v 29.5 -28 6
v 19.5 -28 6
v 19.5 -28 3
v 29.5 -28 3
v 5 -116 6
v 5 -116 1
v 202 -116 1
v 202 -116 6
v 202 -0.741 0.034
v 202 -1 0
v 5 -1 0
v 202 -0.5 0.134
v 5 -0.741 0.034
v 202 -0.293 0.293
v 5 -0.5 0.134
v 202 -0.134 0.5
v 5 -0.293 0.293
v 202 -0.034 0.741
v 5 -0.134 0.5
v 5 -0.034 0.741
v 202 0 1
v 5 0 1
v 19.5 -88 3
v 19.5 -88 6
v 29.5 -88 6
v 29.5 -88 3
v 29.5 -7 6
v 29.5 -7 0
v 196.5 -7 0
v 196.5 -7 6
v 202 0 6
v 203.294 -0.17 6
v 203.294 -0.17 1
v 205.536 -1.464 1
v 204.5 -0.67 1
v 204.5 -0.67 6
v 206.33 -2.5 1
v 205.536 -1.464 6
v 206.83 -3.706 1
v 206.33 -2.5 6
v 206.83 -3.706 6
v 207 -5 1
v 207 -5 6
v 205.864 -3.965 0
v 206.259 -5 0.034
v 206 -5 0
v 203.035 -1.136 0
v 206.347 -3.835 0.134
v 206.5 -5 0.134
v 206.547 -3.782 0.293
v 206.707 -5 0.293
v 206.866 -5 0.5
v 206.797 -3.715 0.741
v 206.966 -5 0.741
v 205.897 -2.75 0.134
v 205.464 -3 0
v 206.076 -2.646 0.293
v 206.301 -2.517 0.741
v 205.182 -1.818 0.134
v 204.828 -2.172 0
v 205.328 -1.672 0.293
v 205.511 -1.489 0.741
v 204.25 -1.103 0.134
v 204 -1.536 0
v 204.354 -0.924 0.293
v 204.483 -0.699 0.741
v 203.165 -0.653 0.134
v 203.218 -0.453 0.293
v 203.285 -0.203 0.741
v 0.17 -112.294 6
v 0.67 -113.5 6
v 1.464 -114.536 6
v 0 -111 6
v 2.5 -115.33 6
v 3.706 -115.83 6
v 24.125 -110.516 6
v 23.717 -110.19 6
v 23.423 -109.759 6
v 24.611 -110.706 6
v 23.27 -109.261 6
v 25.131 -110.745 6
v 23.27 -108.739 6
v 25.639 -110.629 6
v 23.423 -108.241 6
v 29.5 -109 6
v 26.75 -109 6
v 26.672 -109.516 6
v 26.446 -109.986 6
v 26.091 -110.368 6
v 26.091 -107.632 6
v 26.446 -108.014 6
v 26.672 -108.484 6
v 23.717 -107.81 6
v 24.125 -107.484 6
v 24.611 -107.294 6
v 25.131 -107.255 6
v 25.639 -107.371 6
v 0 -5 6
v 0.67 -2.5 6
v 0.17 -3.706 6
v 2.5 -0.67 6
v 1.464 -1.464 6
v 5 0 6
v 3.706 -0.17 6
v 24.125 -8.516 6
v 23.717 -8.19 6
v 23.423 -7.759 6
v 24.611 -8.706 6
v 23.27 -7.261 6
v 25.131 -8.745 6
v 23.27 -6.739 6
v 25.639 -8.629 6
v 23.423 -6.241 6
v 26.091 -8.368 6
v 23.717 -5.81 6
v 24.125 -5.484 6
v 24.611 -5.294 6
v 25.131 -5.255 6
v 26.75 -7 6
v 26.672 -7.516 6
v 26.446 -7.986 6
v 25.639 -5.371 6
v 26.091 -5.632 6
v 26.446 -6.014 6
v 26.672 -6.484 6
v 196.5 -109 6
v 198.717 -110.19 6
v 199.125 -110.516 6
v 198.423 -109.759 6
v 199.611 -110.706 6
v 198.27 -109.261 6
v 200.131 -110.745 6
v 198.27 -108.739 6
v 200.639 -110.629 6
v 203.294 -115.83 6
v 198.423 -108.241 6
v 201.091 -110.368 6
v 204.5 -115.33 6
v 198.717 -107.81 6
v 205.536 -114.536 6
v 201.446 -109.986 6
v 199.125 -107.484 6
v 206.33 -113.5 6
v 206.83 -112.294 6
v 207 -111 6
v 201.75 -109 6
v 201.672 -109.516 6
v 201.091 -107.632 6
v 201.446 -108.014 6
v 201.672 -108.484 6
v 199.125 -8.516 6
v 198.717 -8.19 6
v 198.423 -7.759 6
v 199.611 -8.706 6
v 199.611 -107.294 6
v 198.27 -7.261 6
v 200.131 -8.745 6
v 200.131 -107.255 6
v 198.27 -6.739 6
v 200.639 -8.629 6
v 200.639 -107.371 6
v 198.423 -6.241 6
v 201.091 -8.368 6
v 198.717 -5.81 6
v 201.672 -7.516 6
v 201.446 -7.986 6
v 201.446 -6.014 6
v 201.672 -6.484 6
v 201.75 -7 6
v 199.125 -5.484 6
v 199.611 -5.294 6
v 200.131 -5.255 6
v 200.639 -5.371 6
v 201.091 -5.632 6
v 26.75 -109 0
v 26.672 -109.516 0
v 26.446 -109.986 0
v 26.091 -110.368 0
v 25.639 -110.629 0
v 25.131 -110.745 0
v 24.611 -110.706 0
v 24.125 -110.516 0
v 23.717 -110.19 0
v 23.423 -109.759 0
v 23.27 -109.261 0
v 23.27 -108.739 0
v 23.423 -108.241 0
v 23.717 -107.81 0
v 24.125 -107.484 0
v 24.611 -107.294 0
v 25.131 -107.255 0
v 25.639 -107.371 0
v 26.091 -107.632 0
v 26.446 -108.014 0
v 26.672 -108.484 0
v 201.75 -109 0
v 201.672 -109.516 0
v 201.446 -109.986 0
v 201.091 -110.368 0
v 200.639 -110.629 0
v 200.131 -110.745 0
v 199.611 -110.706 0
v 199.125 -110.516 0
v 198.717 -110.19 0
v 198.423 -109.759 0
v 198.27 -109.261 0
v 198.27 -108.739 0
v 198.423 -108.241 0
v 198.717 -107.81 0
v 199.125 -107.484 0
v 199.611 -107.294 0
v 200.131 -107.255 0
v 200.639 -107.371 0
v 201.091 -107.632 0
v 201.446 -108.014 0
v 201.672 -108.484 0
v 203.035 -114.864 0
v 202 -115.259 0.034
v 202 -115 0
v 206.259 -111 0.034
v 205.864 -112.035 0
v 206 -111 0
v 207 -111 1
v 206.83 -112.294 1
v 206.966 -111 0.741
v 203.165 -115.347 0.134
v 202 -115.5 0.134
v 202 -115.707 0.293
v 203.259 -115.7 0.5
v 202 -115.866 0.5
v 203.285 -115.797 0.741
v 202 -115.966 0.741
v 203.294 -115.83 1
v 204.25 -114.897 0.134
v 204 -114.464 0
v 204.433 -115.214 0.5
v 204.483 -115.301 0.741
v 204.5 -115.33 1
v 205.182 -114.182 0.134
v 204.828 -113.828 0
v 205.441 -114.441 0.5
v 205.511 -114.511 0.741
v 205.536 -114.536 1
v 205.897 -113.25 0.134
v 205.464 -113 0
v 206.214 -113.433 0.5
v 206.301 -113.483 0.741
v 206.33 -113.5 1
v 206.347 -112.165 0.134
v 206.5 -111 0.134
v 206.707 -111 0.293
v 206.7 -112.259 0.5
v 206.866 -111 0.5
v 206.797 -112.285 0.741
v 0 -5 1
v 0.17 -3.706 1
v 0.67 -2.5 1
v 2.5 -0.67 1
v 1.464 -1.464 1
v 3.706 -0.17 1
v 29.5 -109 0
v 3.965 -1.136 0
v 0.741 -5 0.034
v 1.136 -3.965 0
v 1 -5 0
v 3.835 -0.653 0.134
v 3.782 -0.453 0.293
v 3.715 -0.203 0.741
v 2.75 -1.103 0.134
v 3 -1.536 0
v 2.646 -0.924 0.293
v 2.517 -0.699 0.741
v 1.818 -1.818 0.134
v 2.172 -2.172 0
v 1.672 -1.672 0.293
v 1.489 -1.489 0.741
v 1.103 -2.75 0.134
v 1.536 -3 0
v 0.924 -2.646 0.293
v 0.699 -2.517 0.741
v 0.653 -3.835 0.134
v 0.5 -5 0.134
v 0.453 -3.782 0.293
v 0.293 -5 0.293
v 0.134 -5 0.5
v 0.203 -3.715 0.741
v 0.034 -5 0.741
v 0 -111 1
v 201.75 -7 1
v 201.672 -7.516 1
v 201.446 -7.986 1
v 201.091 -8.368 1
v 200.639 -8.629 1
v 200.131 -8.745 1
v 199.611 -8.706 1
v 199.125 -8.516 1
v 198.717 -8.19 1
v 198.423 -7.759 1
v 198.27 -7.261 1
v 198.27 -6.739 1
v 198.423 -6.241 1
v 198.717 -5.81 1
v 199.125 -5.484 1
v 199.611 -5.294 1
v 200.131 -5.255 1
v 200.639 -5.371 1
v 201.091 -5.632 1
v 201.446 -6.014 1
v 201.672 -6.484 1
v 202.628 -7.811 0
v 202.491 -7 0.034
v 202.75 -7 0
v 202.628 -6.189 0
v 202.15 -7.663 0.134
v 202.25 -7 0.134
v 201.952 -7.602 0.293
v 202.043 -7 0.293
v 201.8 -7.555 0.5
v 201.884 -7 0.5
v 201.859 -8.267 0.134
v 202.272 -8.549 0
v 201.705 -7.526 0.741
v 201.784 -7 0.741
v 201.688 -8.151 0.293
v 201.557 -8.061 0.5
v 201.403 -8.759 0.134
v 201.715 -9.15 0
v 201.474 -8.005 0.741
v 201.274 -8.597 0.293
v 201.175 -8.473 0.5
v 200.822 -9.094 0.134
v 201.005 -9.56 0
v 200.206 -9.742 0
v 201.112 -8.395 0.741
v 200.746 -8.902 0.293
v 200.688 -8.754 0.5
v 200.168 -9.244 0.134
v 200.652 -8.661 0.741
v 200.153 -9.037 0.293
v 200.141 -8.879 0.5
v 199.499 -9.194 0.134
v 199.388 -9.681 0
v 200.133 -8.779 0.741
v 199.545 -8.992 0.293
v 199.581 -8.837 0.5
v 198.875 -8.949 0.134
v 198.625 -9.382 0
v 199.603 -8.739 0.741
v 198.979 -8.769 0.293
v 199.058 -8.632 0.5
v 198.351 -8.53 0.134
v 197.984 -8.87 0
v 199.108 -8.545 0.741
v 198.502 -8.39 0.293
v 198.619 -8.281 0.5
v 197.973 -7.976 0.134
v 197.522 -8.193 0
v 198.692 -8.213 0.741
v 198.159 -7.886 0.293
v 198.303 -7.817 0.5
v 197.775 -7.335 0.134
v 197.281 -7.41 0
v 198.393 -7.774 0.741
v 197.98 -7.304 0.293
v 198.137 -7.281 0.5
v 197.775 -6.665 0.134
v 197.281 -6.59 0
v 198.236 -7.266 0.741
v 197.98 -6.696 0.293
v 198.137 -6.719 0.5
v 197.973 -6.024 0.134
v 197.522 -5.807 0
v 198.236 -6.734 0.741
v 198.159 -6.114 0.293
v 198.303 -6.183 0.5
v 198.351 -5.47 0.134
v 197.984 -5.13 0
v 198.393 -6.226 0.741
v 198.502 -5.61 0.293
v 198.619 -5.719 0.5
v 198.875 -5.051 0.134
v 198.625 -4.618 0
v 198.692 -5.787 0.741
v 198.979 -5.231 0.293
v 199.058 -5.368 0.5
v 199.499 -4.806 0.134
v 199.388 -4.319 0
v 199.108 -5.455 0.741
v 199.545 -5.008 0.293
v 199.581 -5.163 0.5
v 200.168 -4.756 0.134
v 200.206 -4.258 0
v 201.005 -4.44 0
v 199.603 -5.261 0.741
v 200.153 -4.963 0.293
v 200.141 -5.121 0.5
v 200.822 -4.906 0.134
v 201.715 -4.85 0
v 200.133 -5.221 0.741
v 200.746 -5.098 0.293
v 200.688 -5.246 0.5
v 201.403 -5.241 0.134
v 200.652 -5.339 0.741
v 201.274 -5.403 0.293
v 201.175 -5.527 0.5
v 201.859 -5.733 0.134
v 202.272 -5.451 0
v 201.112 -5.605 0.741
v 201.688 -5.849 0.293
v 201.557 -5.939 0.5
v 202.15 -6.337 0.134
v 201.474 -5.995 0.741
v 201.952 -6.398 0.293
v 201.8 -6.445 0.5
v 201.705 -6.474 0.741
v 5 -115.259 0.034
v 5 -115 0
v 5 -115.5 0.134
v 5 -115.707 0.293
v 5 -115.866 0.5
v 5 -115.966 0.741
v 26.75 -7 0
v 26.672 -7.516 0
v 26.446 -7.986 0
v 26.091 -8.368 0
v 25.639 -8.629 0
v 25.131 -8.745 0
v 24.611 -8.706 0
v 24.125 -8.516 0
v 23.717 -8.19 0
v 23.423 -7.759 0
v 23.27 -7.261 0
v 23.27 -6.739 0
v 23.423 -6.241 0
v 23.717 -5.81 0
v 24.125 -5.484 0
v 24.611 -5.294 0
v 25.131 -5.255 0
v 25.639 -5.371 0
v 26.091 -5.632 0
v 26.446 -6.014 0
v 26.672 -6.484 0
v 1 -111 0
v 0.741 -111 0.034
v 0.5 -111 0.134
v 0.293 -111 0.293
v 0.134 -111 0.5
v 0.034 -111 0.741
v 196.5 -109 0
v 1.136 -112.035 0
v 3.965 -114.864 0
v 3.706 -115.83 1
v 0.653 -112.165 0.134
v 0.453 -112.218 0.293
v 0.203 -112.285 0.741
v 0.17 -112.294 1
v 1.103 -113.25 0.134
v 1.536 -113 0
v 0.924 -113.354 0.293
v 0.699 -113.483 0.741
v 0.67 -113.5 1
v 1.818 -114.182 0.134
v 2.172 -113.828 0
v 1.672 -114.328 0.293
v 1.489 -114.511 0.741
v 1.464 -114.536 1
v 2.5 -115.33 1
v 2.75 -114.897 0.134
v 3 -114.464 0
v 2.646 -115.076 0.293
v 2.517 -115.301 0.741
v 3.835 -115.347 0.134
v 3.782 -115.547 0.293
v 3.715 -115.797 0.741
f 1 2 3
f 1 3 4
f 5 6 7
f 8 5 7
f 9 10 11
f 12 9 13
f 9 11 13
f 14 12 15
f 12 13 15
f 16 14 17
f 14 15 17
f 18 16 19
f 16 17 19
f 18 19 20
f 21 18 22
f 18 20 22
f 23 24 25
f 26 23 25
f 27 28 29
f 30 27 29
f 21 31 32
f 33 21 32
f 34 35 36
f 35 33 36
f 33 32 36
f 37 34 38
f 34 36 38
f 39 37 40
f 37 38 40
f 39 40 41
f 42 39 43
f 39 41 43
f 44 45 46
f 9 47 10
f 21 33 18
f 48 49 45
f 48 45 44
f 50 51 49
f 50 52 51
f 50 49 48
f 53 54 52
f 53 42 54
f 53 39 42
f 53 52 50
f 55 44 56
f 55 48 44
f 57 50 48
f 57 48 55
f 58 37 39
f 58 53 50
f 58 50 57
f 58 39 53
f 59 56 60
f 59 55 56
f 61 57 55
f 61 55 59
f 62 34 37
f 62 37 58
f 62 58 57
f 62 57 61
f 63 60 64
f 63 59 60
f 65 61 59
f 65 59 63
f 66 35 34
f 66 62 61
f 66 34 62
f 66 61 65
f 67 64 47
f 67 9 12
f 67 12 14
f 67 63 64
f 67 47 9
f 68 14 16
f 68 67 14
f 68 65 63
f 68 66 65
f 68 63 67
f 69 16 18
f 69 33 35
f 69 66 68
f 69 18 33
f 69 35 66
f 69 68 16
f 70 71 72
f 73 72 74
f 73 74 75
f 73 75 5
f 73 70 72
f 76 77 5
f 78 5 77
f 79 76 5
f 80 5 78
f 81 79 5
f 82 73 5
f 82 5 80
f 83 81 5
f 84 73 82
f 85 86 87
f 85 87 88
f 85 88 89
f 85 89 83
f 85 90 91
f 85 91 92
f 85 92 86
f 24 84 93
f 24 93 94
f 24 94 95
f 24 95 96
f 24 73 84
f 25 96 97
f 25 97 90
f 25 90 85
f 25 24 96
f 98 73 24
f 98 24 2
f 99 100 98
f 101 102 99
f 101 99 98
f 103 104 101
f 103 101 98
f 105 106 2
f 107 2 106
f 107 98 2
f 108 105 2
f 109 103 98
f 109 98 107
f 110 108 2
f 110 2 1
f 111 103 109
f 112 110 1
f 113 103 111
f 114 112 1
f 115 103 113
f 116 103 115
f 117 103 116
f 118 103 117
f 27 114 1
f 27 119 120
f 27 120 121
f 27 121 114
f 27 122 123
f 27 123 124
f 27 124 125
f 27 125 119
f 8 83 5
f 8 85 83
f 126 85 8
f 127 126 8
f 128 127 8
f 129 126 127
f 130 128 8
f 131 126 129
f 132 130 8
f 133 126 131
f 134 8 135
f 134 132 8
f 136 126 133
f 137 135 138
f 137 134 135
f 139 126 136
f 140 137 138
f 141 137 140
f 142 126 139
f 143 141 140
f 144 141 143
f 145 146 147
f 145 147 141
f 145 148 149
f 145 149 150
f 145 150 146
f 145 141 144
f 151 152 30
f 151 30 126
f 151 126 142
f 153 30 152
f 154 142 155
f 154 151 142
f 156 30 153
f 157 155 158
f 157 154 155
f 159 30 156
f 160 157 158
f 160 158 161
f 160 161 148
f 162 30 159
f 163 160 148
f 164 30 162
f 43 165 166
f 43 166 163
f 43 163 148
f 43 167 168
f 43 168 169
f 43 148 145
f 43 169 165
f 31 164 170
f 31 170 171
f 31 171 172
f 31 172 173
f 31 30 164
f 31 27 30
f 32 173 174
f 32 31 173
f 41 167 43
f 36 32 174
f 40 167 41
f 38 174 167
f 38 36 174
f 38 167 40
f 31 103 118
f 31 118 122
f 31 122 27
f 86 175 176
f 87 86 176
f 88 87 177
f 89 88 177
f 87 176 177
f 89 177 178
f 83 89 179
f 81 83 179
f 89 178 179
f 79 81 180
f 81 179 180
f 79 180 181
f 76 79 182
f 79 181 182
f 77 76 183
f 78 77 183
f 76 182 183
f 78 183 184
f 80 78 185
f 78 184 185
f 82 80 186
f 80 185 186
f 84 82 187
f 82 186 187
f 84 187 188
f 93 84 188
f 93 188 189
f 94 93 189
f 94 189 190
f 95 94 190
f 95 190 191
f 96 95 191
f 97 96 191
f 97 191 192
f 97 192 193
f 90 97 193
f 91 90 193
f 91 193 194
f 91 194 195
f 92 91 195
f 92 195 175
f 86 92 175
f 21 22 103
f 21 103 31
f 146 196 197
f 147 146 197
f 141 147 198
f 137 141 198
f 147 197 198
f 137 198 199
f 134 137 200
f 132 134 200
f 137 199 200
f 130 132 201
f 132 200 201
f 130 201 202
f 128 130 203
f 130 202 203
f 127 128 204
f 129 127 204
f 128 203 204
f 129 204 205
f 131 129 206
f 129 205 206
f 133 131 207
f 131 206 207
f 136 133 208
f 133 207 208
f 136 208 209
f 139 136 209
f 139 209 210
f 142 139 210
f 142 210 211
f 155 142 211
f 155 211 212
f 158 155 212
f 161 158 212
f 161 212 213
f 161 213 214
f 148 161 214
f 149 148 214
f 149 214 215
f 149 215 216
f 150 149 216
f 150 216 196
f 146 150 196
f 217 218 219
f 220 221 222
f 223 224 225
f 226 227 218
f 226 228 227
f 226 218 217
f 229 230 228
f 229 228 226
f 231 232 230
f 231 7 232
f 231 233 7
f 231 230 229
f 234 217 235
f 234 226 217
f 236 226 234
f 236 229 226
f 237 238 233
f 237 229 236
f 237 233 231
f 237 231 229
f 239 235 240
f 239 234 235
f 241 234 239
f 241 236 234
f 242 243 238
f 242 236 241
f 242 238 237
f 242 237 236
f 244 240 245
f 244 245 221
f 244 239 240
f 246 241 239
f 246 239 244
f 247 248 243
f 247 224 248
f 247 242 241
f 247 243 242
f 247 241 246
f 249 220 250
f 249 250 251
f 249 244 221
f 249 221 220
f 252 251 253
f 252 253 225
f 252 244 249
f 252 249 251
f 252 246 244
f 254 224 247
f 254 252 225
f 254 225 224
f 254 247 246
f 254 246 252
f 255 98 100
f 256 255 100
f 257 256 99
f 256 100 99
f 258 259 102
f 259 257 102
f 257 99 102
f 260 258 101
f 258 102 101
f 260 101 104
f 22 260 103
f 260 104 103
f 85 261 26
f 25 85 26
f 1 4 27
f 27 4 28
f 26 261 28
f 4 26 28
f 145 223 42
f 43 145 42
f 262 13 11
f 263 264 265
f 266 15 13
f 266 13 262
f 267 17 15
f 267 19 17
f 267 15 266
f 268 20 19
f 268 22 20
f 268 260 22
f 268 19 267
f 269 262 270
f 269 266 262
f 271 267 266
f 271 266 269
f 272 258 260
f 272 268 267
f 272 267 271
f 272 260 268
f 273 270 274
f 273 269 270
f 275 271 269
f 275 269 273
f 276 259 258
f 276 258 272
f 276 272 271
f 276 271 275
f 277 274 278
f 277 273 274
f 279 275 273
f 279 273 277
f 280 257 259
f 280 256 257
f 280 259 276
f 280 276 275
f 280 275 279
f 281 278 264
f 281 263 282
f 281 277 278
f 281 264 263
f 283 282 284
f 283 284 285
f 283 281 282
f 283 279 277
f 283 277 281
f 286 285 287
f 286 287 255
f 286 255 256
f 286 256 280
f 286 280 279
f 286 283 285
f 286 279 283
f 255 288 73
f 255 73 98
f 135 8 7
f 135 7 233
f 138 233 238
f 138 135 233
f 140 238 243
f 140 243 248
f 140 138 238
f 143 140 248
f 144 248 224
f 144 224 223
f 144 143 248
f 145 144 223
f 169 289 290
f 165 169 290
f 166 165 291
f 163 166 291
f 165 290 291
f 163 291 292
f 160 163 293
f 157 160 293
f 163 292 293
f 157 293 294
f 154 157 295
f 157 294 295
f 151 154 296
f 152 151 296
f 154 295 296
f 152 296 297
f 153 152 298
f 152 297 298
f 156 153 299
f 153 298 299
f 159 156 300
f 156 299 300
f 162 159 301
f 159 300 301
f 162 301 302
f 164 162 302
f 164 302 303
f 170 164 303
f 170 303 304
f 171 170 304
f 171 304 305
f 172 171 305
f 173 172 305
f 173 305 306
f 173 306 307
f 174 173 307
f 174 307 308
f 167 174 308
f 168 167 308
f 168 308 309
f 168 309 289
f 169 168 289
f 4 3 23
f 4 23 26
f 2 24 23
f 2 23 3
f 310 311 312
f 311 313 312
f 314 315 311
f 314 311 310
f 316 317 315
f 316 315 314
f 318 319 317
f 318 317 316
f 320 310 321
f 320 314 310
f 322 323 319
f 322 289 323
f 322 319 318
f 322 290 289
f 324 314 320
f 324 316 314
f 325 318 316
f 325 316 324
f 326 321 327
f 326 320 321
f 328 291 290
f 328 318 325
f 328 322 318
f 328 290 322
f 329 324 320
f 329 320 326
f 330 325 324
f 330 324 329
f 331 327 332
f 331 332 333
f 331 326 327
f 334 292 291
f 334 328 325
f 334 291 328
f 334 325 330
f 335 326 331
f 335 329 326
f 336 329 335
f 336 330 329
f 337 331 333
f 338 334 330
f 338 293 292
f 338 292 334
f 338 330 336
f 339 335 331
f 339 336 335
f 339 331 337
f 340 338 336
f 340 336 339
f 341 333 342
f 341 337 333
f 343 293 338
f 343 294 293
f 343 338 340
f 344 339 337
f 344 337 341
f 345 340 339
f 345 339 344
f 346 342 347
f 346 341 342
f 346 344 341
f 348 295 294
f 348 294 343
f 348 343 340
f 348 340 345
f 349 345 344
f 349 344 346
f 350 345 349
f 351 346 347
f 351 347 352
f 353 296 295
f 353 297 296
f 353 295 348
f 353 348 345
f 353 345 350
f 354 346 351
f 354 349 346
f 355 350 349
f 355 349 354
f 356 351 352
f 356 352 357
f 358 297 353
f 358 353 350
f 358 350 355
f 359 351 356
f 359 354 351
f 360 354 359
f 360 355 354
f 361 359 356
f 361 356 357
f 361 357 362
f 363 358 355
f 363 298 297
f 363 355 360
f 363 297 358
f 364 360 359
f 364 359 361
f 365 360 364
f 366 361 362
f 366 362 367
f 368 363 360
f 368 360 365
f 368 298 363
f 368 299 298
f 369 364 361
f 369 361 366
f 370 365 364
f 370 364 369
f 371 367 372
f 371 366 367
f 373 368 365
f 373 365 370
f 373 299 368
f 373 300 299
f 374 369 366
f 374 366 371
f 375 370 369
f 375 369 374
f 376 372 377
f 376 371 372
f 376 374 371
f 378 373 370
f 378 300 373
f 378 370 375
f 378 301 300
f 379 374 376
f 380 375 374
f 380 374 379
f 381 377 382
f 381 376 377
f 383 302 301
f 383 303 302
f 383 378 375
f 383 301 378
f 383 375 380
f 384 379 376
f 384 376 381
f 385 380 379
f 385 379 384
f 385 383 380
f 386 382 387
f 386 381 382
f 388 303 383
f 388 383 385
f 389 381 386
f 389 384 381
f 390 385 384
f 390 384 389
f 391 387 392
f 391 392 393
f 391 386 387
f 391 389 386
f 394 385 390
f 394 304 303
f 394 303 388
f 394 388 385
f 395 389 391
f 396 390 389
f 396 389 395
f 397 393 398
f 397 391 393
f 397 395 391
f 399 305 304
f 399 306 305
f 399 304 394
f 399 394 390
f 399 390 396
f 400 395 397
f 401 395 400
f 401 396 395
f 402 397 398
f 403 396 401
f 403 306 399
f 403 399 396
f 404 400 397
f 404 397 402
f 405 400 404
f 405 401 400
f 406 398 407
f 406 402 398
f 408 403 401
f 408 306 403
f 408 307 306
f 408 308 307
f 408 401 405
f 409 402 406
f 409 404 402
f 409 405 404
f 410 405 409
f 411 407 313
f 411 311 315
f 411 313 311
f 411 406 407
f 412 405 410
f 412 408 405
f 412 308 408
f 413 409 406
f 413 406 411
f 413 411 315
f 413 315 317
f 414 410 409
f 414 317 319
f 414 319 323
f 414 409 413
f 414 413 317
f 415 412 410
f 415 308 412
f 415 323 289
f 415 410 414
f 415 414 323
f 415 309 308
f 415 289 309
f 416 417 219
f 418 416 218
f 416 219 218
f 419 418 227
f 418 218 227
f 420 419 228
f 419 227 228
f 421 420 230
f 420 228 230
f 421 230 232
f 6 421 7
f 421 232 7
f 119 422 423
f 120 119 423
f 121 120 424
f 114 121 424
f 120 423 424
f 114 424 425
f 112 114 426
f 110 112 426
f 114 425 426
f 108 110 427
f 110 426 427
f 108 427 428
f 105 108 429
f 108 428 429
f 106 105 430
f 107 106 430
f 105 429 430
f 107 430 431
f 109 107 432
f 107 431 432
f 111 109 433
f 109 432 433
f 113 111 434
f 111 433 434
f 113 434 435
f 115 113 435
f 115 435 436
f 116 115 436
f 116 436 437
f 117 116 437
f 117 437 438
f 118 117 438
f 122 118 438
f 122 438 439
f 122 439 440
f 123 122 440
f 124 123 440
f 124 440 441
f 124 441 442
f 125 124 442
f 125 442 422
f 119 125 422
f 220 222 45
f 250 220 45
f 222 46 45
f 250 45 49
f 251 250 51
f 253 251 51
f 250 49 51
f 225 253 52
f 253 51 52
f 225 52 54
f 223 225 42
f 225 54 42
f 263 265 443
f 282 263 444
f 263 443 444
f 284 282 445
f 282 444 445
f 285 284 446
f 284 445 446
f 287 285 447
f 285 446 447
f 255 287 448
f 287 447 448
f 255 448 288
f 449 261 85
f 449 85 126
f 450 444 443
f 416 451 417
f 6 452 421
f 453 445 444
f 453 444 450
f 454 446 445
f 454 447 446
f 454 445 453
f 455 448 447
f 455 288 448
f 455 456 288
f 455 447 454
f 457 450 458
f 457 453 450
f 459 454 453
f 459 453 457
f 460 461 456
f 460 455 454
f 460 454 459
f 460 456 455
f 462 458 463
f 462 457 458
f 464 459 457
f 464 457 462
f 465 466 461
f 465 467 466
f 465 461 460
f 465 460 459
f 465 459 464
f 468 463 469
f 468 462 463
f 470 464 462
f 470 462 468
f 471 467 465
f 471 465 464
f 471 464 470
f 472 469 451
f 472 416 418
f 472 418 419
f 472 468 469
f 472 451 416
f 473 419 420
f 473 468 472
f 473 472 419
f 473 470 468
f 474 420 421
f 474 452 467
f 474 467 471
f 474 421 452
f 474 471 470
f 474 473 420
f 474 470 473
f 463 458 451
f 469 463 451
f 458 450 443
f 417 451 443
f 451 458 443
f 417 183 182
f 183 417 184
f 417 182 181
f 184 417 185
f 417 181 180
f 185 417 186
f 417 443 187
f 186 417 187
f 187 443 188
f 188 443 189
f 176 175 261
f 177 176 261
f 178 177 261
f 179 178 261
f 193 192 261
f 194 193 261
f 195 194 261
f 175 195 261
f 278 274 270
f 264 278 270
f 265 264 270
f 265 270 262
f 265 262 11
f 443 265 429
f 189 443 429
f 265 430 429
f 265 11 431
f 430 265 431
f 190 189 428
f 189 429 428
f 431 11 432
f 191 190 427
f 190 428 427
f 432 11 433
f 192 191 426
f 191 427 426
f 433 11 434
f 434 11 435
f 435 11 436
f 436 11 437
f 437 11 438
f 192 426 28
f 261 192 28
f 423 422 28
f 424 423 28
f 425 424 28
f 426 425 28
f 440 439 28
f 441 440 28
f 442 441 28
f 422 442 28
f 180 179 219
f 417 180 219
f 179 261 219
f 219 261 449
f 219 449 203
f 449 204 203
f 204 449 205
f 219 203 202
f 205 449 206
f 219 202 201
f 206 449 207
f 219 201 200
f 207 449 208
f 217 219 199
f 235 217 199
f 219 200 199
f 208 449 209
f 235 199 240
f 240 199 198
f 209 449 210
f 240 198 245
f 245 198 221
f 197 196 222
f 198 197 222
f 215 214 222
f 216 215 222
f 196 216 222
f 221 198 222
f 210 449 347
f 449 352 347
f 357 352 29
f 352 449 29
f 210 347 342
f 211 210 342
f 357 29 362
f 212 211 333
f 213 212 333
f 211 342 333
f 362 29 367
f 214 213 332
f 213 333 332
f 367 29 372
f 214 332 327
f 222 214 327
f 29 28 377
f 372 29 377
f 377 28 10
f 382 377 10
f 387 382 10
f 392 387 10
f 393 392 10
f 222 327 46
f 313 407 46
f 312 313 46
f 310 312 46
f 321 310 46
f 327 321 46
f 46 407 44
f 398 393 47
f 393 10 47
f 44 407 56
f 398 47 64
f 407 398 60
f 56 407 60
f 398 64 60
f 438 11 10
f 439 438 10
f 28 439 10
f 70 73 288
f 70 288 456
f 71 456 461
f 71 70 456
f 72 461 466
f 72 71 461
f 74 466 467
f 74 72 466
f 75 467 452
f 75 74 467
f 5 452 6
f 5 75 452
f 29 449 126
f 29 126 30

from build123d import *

# Parameters (mm, degrees)
F0_W     = 207
F0_H     = 116
F1_DEPTH = 6
F2_W     = 167
F2_H     = 102
F3_DEPTH = 25
F4_R     = 1.75
F5_DEPTH = 25
F6_R     = 5
F7_R     = 1
F8_W     = 10
F8_H     = 60
F9_DEPTH = 3


with BuildPart() as f1:
    # F0 (on Top) → F1 (new body)
    with BuildSketch(Plane.XY):
        with Locations((103.5, -58)):
            Rectangle(F0_W, F0_H)
    extrude(amount=F1_DEPTH)

    # F2 (on face) → F3 (cut)
    with BuildSketch(Plane.XY):
        with Locations((113, -58)):
            Rectangle(F2_W, F2_H)
    extrude(amount=F3_DEPTH, mode=Mode.SUBTRACT)

    # F4 (on face) → F5 (cut)
    with BuildSketch(Plane(origin=(0, 0, 0), x_dir=(1, 0, 0), z_dir=(0, 0, -1))):
        with Locations((200, 7)):
            Circle(F4_R)
        with Locations((200, 109)):
            Circle(F4_R)
        with Locations((25, 109)):
            Circle(F4_R)
        with Locations((25, 7)):
            Circle(F4_R)
    extrude(amount=-F5_DEPTH, mode=Mode.SUBTRACT)

    # F6
    f6_edges = [f1.edges().sort_by_distance(p)[0] for p in [
        (207, 0, 3),
        (207, -116, 3),
        (0, -116, 3),
        (0, 0, 3),
    ]]
    fillet(f6_edges, radius=F6_R)

    # F7
    f7_edges = [f1.edges().sort_by_distance(p)[0] for p in [
        (207, -58, 0),
        (198.25, -7, 0),
    ]]
    fillet(f7_edges, radius=F7_R)

    # F8 (on face) → F9 (cut)
    with BuildSketch(Plane.XY.offset(6)):
        with Locations((24.5, -58)):
            Rectangle(F8_W, F8_H)
    extrude(amount=-F9_DEPTH, mode=Mode.SUBTRACT)


solid = f1.part
